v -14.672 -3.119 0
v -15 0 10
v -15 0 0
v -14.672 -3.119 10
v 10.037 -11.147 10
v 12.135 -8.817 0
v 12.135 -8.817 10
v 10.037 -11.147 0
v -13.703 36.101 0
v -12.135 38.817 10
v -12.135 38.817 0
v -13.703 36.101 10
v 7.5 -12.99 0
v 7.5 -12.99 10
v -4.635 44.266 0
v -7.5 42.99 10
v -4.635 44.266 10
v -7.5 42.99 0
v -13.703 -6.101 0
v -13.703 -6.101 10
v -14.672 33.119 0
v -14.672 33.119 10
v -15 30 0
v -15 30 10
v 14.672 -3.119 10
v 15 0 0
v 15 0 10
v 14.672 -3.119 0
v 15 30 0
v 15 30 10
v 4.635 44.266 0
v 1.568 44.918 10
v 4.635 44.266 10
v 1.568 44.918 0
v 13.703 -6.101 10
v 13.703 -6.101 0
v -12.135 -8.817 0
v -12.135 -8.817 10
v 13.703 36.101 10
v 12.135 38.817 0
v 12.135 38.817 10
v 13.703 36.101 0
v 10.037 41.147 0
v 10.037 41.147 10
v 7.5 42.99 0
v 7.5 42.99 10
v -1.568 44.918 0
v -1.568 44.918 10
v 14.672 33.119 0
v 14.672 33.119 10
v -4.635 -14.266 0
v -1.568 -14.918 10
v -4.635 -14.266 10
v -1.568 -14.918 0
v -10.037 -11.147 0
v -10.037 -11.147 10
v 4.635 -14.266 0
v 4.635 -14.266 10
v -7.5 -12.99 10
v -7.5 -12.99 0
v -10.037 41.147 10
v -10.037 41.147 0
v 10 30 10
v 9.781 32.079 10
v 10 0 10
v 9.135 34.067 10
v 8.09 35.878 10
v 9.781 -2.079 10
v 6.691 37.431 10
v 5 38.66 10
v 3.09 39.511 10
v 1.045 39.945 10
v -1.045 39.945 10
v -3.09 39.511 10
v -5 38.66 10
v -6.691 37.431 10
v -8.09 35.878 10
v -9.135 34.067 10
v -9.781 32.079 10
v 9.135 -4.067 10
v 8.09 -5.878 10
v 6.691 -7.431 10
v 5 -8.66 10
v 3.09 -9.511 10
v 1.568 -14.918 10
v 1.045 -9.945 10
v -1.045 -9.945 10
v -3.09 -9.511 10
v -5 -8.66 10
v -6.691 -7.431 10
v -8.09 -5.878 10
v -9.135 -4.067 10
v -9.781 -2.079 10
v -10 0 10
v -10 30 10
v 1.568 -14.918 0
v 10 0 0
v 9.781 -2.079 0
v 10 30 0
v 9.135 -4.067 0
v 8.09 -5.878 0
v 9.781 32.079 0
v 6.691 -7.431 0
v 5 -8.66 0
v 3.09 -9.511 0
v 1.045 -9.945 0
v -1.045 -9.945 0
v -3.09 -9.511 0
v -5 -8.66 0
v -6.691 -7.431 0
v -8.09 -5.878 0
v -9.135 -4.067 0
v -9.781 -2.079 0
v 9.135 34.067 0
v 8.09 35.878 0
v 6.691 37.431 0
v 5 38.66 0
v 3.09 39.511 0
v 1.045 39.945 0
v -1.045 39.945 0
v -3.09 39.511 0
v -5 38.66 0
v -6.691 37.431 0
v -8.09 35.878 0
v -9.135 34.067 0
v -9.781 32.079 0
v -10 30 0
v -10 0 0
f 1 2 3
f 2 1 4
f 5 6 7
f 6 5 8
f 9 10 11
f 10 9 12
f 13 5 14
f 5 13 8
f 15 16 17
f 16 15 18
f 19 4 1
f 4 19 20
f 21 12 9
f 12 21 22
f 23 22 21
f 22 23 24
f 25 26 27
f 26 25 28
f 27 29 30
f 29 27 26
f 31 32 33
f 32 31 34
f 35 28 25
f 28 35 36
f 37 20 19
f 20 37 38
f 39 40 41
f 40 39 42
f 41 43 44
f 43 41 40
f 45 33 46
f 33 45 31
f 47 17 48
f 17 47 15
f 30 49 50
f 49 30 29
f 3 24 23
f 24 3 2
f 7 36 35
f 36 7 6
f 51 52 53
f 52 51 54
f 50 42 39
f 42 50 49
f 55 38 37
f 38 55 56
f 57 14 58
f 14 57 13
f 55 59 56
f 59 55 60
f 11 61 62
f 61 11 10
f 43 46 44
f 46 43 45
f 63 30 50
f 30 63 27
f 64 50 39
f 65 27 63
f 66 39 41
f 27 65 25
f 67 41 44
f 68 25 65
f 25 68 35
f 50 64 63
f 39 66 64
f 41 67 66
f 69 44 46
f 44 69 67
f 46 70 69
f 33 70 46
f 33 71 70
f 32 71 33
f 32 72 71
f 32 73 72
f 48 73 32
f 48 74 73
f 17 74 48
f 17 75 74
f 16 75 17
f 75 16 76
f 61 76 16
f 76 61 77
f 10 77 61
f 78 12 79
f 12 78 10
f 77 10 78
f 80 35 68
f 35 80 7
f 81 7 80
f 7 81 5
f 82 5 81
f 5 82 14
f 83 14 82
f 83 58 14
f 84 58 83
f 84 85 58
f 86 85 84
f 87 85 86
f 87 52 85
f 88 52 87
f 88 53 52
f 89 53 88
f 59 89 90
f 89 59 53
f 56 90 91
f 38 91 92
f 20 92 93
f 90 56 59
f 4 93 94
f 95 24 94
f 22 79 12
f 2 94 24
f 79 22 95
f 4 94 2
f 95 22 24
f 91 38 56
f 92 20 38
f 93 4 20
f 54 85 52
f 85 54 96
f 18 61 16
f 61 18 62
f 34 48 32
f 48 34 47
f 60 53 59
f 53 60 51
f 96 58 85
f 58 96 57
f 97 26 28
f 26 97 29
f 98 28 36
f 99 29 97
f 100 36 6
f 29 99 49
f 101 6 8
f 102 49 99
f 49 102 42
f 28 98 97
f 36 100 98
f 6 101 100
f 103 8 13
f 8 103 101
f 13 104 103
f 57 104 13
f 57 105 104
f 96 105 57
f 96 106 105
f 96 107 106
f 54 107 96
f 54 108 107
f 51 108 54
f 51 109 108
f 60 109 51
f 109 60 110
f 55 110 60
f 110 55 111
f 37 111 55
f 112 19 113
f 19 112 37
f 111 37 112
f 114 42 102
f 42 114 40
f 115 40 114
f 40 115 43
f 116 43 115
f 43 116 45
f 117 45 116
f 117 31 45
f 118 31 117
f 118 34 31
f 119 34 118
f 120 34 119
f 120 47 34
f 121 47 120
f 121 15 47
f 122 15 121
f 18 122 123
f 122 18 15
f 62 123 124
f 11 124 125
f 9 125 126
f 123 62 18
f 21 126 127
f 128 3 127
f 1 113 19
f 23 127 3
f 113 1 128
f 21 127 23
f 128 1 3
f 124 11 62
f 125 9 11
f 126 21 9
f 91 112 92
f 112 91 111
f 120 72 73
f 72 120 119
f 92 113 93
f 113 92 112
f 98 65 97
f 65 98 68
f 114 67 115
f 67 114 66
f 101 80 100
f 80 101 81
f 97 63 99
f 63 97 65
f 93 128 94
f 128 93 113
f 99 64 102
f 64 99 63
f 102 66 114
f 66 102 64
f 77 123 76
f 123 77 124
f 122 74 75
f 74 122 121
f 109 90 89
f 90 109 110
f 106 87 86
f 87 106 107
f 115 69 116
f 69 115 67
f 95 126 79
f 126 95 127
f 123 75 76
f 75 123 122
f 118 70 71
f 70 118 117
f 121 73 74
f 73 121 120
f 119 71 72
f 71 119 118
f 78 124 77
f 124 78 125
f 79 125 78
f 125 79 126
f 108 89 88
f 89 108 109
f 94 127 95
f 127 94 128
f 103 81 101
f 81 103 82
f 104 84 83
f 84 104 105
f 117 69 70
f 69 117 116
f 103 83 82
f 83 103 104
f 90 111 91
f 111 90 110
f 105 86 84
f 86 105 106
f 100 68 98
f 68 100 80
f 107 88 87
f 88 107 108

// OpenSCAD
//
//difference(){
//    cube([30,30,6], center=true);
//
//    translate([0,0,3]) {
//    //cube([10,30,3], center=true);
//    //cube([30,10,3], center=true);
//        rotate([0,0,45]) cube([30,30,6], center=true);
//    }
//}
//
//difference(){
//cylinder(d=10,h=6);;
//cylinder(d=5,h=6);;
//}


difference(){

hull(){
cylinder(d = 30,h=10);
translate([0,30,0]) cylinder(d = 30,h=10);
}



hull(){
cylinder(d = 20,h=10);
translate([0,30,0]) cylinder(d = 20,h=10);
}
}
